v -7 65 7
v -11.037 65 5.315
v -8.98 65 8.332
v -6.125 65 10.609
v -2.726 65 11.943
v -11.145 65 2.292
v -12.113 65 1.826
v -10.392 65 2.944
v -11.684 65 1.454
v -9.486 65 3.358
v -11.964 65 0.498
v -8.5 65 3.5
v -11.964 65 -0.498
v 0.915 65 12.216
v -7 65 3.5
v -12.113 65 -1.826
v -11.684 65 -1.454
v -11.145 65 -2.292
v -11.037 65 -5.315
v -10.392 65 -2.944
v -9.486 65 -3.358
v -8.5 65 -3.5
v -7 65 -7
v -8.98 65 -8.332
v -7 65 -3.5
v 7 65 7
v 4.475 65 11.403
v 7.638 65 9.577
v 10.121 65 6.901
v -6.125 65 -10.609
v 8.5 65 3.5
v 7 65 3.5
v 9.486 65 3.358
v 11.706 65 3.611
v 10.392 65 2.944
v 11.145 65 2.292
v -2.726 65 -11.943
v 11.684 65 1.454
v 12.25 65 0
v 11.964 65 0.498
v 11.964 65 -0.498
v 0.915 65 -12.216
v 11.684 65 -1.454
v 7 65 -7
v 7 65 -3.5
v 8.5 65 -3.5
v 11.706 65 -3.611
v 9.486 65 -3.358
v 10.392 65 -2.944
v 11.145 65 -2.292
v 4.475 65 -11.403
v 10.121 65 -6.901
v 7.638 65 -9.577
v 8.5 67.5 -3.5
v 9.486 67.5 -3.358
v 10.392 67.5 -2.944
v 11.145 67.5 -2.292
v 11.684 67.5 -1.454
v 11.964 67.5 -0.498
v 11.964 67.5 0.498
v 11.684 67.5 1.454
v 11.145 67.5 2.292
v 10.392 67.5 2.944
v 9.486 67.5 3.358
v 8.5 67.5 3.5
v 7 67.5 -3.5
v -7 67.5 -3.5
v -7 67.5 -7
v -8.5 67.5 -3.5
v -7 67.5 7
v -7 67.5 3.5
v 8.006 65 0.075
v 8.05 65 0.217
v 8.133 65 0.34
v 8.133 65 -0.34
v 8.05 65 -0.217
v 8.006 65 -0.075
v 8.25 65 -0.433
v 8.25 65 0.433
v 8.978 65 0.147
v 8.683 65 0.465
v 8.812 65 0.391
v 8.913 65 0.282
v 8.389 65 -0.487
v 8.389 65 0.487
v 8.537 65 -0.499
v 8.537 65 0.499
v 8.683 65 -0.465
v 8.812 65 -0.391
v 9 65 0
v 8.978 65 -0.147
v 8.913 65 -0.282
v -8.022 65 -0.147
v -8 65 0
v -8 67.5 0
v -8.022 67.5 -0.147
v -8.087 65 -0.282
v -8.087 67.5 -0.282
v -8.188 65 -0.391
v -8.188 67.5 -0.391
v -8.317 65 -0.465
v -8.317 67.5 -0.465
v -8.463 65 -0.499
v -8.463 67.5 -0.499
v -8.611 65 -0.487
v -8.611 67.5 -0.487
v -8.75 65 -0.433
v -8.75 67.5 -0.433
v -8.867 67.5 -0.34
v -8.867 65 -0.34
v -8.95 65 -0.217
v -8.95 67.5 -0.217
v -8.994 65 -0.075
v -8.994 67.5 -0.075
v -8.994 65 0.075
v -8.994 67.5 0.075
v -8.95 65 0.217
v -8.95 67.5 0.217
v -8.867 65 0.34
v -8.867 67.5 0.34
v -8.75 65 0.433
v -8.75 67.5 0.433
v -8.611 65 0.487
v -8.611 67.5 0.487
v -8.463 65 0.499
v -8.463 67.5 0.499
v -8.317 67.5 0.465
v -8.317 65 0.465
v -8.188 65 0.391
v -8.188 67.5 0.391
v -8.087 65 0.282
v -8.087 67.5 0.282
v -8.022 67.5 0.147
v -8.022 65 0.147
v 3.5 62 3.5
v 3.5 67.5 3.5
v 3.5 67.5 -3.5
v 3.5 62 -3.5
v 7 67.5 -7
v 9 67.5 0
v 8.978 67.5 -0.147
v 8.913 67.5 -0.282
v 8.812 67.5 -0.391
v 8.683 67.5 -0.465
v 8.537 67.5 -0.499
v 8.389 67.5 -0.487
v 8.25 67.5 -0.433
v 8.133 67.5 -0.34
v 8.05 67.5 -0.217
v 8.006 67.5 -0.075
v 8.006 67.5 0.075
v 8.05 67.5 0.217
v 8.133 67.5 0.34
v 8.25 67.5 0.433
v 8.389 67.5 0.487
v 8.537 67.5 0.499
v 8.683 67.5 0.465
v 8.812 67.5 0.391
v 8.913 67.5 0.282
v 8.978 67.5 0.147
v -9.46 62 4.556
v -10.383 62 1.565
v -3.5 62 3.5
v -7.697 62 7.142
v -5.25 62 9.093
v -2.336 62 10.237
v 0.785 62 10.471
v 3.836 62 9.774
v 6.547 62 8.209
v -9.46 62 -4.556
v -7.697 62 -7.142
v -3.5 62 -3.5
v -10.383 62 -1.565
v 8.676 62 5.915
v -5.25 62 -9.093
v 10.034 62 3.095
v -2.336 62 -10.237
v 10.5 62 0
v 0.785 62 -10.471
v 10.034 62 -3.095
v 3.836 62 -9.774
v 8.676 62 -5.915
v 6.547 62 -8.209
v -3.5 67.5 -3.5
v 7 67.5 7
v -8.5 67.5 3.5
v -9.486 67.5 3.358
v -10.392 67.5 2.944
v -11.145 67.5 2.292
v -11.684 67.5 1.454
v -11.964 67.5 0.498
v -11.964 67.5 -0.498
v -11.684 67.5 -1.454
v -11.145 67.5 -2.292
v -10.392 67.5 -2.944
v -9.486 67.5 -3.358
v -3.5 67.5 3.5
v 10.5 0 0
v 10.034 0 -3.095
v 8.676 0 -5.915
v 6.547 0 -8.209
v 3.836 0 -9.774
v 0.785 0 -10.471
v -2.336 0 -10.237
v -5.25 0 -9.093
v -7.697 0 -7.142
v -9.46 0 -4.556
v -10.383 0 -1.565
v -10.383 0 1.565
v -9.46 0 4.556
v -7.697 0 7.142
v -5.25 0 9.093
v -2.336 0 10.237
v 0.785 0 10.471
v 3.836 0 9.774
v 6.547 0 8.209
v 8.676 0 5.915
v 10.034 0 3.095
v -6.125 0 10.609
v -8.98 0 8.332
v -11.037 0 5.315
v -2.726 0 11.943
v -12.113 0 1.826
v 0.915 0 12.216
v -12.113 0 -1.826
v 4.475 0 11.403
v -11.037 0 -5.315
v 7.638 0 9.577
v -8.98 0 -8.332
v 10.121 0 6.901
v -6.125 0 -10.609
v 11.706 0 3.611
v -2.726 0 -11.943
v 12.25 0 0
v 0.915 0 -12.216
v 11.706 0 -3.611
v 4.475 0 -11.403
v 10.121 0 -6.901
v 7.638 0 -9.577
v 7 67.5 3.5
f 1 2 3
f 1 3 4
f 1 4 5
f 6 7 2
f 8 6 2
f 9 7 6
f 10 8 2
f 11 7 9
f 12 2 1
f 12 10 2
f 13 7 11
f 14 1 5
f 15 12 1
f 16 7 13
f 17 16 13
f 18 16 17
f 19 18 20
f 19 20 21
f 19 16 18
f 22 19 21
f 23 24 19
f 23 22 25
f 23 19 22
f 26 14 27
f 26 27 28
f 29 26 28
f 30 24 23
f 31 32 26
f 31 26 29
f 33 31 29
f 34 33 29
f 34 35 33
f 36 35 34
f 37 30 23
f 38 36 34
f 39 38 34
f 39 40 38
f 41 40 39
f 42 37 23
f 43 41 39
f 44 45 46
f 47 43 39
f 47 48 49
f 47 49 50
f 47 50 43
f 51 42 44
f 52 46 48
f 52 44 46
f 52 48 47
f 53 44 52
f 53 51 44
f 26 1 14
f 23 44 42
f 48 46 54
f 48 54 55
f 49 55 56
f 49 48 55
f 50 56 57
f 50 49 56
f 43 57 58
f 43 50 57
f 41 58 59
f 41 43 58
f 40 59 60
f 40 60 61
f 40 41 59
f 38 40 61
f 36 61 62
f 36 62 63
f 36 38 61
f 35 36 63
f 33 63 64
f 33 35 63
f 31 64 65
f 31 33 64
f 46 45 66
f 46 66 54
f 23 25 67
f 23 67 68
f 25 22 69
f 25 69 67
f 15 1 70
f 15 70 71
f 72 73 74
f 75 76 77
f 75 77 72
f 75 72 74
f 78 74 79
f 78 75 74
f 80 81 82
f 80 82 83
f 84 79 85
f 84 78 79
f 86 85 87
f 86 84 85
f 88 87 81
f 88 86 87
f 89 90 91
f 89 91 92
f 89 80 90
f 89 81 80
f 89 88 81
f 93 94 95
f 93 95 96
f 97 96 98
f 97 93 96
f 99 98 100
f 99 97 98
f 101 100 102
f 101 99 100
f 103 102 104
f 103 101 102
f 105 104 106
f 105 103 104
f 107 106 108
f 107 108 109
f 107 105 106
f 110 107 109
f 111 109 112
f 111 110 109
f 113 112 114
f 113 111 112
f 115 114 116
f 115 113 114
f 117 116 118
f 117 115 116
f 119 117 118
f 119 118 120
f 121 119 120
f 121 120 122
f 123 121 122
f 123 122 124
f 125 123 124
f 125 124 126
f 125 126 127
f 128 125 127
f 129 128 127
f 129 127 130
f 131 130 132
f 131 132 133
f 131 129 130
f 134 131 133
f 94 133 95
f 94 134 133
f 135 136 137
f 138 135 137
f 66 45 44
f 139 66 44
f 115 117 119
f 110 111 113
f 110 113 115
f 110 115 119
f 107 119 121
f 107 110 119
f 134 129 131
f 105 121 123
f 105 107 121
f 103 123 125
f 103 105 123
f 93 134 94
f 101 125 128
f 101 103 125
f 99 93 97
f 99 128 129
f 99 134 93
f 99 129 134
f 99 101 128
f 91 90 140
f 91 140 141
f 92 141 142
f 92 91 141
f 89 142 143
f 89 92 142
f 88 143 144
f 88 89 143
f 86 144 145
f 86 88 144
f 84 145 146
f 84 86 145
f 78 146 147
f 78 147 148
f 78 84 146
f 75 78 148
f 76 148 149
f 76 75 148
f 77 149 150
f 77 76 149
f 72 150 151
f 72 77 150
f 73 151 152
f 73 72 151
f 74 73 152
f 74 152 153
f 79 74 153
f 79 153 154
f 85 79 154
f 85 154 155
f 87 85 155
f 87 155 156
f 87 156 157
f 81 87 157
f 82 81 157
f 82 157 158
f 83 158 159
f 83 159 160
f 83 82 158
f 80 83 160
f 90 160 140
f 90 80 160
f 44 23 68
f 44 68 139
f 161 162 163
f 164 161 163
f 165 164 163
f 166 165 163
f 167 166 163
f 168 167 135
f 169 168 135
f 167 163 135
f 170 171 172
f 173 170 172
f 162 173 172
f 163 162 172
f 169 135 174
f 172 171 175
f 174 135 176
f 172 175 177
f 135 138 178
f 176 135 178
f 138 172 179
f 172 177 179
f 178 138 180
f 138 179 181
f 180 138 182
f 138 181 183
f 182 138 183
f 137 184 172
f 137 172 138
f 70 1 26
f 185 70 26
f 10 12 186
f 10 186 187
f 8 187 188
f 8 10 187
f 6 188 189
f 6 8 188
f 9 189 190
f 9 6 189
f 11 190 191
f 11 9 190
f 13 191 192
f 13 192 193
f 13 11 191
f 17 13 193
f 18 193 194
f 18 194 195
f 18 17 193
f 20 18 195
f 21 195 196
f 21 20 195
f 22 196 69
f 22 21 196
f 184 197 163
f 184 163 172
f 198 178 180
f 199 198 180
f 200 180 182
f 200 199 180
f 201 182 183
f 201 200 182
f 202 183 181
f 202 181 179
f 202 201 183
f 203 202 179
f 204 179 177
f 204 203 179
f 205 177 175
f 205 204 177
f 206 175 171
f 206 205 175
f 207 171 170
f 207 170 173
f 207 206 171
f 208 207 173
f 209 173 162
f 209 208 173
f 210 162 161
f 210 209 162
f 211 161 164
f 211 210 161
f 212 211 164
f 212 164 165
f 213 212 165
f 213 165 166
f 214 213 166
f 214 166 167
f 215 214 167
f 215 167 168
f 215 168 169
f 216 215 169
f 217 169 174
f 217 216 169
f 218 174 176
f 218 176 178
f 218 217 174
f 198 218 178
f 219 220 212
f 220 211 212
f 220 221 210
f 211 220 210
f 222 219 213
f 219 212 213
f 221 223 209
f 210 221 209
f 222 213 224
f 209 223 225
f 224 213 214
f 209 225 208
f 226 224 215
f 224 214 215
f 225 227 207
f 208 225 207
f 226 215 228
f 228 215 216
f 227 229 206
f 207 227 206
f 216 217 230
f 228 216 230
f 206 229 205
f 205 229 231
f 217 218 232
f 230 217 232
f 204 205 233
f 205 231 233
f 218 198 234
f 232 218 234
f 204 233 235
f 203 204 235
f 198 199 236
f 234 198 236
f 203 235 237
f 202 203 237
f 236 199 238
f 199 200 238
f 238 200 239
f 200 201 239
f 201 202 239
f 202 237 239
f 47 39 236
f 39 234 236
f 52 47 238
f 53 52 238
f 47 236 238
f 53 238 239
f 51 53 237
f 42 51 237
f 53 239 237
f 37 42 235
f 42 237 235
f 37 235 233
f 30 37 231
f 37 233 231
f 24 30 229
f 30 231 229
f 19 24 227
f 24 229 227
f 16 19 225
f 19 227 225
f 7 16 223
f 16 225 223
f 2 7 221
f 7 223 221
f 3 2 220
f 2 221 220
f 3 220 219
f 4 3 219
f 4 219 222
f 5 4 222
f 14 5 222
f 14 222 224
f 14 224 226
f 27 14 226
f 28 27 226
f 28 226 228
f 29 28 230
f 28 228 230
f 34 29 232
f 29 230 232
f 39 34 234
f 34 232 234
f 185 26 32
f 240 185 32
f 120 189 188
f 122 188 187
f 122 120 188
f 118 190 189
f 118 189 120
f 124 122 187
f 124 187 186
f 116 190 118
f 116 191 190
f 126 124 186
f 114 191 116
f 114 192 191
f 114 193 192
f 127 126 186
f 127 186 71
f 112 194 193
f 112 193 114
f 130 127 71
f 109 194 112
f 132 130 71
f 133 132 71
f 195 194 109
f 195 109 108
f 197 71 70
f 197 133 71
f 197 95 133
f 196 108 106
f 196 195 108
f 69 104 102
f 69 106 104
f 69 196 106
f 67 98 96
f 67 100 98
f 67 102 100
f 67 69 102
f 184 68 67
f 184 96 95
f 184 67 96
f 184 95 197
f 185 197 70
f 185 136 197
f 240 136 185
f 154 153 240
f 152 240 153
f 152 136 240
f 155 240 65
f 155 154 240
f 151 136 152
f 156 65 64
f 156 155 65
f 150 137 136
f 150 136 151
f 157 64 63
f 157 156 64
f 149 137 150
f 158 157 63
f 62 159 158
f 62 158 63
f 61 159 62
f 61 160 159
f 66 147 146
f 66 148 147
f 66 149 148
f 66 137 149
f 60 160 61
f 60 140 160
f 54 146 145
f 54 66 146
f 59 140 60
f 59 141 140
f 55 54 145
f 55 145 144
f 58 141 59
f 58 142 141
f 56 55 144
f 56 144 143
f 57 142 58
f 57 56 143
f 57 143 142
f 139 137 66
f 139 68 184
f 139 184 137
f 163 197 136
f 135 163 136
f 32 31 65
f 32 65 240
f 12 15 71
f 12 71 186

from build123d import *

# Parameters (mm, degrees)
SKETCH1_R               = 12.25
SKETCH1_R_2             = 10.5
BOSS_EXTRUDE1_DEPTH     = 62
SKETCH2_R               = 12.25
BOSS_EXTRUDE2_DEPTH     = 3
SKETCH8_W               = 14
SKETCH8_H               = 14
SKETCH8_R               = 0.5
BOSS_EXTRUDE5_DEPTH     = 2.5
SKETCH9_W               = 7
SKETCH9_H               = 7
CUT_EXTRUDE3_DEPTH      = 1
CUT_EXTRUDE3_DEPTH_BACK = 68.5


with BuildPart() as part:
    # Sketch1 → Boss-Extrude1 (new body)
    with BuildSketch(Plane(origin=(0, 0, 0), x_dir=(1, 0, 0), z_dir=(0, 1, 0))):
        Circle(SKETCH1_R)
        Circle(SKETCH1_R_2, mode=Mode.SUBTRACT)
    extrude(amount=BOSS_EXTRUDE1_DEPTH)

    # Sketch2 → Boss-Extrude2 (add)
    with BuildSketch(Plane(origin=(0, 62, 0), x_dir=(1, 0, 0), z_dir=(0, 1, 0))):
        Circle(SKETCH2_R)
    extrude(amount=BOSS_EXTRUDE2_DEPTH)

    # Sketch8 → Boss-Extrude5 (add)
    with BuildSketch(Plane(origin=(0, 65, 0), x_dir=(1, 0, 0), z_dir=(0, 1, 0))):
        Rectangle(SKETCH8_W, SKETCH8_H)
        with BuildLine():
            Line((-8.5, 3.5), (8.5, 3.5))
            ThreePointArc((8.5, 3.5), (12, 0), (8.5, -3.5))
            Line((8.5, -3.5), (-8.5, -3.5))
            ThreePointArc((-8.5, -3.5), (-12, 0), (-8.5, 3.5))
        make_face()
        with Locations((8.5, 0)):
            Circle(SKETCH8_R, mode=Mode.SUBTRACT)
        with Locations((-8.5, 0)):
            Circle(SKETCH8_R, mode=Mode.SUBTRACT)
    extrude(amount=BOSS_EXTRUDE5_DEPTH)

    # Sketch9 → Cut-Extrude3 (cut, two sides)
    with BuildSketch(Plane(origin=(0, 67.5, 0), x_dir=(1, 0, 0), z_dir=(0, 1, 0))) as cut_extrude3_sk:
        Rectangle(SKETCH9_W, SKETCH9_H)
    extrude(amount=CUT_EXTRUDE3_DEPTH, mode=Mode.SUBTRACT)
    extrude(cut_extrude3_sk.sketch, amount=-CUT_EXTRUDE3_DEPTH_BACK, mode=Mode.SUBTRACT)


solid = part.part
